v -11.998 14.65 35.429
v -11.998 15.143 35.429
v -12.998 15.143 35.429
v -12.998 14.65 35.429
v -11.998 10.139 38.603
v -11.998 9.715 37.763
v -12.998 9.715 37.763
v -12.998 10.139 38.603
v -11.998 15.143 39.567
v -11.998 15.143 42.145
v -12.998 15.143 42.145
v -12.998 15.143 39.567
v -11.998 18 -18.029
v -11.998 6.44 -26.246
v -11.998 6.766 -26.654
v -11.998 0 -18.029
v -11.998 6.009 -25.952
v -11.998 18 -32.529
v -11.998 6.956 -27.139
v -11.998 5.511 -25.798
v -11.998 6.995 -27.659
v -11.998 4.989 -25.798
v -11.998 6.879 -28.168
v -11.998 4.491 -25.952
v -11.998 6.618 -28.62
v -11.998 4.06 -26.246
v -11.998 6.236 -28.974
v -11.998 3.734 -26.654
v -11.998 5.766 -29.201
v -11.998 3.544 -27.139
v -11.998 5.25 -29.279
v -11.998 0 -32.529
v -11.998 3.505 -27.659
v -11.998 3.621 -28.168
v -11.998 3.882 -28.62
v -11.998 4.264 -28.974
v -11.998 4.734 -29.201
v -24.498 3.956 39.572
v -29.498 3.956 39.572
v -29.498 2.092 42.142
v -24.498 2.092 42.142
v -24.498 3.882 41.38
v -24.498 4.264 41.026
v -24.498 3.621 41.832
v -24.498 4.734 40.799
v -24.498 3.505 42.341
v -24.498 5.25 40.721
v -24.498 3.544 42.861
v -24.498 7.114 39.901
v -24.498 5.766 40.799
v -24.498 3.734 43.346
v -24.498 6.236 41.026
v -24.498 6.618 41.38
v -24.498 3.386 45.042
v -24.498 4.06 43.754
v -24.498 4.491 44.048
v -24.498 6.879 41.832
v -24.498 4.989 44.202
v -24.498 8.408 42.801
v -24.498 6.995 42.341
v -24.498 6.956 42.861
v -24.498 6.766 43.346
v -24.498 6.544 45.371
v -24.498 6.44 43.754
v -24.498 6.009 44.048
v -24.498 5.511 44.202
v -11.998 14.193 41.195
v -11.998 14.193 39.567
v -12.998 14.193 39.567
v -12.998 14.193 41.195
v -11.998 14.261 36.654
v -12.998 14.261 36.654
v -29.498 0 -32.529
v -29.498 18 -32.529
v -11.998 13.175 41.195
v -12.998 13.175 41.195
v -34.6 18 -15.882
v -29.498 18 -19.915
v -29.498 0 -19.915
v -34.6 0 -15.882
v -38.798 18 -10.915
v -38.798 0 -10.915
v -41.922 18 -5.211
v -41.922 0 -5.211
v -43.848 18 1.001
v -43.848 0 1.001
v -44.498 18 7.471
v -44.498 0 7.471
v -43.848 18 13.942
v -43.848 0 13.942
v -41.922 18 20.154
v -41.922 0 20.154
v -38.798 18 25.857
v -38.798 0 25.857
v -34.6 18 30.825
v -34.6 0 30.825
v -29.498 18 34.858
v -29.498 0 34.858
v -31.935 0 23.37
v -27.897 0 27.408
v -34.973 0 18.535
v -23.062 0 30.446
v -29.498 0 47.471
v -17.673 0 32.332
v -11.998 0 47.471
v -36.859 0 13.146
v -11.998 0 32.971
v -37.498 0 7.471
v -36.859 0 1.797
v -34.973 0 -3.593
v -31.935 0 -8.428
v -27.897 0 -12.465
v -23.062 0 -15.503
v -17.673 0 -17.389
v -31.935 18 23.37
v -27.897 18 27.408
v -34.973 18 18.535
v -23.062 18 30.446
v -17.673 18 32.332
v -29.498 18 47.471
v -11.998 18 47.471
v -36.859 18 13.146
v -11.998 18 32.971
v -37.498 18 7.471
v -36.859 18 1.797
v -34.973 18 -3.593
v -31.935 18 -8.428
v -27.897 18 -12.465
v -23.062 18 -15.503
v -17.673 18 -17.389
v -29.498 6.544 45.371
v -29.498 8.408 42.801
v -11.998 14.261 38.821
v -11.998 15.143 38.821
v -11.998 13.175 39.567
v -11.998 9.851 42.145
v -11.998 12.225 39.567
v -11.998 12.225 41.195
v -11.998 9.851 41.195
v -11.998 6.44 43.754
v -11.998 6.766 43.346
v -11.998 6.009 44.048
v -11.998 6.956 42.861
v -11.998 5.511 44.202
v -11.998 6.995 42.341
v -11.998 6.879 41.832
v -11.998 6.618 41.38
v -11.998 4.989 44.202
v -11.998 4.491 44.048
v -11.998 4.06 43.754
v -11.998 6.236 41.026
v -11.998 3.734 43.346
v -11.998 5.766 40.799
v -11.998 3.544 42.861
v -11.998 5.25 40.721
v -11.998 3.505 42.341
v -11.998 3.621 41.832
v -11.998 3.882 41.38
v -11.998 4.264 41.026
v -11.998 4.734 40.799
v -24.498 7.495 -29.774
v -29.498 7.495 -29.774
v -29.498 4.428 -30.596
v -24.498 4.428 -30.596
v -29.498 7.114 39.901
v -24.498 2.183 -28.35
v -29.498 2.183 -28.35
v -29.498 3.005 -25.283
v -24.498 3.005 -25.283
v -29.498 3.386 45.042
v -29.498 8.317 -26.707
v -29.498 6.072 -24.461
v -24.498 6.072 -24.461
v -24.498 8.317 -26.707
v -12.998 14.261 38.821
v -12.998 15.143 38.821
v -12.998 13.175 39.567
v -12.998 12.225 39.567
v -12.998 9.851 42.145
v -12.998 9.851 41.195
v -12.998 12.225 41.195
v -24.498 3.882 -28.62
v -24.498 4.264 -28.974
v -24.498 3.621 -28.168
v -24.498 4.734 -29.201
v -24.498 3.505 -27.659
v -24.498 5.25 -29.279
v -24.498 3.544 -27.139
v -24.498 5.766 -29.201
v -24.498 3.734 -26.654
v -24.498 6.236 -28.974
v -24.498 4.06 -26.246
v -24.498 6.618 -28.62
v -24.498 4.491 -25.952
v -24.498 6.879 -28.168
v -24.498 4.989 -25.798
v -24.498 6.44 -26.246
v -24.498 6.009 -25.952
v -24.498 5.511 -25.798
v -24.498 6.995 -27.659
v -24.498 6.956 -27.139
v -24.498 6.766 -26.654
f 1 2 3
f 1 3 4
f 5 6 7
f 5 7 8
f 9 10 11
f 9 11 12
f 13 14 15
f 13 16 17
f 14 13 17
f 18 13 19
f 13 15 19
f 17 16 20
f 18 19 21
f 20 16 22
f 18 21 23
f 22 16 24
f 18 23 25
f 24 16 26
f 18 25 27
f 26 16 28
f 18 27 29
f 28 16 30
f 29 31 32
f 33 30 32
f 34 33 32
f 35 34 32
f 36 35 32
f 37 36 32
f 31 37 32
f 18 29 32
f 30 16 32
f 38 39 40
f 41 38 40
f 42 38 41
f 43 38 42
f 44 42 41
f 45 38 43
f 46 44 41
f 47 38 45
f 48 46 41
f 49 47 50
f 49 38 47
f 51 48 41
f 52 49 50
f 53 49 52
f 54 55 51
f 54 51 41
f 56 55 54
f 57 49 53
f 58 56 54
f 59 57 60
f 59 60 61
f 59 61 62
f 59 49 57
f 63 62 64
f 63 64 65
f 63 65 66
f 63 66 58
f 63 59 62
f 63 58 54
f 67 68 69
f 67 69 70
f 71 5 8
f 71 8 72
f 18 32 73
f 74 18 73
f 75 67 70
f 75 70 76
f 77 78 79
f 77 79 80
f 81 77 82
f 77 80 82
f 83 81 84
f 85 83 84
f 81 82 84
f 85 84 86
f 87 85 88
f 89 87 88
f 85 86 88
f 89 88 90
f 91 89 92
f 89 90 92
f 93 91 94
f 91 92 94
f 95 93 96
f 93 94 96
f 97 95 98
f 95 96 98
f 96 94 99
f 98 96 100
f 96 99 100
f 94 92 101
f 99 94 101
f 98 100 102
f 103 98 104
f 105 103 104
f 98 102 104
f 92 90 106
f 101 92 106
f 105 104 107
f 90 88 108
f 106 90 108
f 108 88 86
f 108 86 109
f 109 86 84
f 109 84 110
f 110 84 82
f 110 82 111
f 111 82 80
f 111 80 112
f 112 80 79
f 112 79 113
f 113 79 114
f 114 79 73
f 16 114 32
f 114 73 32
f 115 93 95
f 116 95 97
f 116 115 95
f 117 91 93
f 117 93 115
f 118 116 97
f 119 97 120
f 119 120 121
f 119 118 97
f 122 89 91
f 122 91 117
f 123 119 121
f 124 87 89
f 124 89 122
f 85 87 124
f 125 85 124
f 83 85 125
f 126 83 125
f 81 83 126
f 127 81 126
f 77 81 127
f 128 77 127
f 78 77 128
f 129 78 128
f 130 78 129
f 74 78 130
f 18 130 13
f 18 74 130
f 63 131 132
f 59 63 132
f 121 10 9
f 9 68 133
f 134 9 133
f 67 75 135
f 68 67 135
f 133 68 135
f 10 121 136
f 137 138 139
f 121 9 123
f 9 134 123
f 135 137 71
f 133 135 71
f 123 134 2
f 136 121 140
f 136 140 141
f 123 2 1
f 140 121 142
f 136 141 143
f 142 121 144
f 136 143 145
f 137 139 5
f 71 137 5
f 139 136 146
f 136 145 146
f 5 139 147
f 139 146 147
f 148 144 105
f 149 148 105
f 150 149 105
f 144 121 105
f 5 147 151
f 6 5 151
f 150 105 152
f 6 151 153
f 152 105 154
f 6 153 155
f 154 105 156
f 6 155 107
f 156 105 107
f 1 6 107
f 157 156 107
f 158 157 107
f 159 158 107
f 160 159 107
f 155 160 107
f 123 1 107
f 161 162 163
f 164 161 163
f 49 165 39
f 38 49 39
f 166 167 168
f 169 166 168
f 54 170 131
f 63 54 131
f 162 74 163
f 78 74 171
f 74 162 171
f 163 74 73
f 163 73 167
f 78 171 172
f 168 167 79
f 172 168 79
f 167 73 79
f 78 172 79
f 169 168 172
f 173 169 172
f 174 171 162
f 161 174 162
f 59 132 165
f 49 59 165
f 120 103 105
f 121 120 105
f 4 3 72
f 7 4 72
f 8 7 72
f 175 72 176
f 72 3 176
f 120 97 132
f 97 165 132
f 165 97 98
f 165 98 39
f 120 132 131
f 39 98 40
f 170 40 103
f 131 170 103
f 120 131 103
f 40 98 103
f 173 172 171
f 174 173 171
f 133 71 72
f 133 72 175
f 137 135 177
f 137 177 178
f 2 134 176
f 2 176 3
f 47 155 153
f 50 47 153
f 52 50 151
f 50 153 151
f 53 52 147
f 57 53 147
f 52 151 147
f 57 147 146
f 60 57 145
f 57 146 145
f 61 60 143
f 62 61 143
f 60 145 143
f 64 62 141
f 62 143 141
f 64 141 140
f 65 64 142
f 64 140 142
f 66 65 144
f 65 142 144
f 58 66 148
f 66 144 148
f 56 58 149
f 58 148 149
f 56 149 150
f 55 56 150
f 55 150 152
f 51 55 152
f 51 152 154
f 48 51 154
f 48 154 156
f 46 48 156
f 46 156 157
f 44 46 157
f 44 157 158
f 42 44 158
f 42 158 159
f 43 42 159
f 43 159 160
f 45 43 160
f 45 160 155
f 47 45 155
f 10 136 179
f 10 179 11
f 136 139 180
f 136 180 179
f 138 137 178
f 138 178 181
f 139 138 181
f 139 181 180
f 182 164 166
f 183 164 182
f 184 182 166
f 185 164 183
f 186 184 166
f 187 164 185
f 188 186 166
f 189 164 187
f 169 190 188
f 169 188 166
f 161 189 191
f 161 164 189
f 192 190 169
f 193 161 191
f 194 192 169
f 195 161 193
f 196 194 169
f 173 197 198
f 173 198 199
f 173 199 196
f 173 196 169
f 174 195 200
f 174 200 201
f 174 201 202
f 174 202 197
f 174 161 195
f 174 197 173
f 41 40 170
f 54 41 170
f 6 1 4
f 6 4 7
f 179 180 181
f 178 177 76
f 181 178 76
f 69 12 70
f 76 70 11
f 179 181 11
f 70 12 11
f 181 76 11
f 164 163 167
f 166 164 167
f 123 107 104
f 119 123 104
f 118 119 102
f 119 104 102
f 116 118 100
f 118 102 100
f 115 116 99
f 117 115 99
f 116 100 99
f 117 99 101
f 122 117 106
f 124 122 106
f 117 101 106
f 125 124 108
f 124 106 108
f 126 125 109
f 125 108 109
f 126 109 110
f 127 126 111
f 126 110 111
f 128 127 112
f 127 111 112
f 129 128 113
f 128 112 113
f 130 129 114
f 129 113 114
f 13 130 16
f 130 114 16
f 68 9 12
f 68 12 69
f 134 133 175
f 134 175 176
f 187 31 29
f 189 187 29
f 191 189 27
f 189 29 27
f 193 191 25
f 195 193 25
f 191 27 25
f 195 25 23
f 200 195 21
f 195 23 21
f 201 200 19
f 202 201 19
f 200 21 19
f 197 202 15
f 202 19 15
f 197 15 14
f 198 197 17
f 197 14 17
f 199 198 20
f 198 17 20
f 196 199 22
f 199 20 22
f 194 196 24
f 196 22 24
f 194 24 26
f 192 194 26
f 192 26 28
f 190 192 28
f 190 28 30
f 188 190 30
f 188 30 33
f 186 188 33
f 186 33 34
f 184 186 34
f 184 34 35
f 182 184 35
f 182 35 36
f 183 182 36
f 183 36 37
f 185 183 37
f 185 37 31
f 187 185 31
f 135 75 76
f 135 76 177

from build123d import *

# Parameters (mm, degrees)
BOSS_EXTRUDE1_DEPTH = 18
SKETCH2_R           = 1.75
CUT_EXTRUDE1_DEPTH  = 33.5
CUT_EXTRUDE2_DEPTH  = 1
CUT_EXTRUDE3_DEPTH  = 5


with BuildPart() as part:
    # Sketch1 → Boss-Extrude1 (new body)
    with BuildSketch(Plane(origin=(0, 0, 0), x_dir=(1, 0, 0), z_dir=(0, 1, 0))):
        with BuildLine():
            Line((-11.998275301, 32.528571429), (-29.498275301, 32.528571429))
            Line((-29.498275301, 32.528571429), (-29.498275301, 19.914699304))
            ThreePointArc((-29.498275301, 19.914699304), (-21.114218589, 23.723916882), (-11.998275301, 25.028571429))
            Line((-11.998275301, 25.028571429), (-11.998275301, 32.528571429))
        make_face()
        with BuildLine():
            ThreePointArc((-11.998275301, 25.028571429), (-21.114218589, 23.723916882), (-29.498275301, 19.914699304))
            ThreePointArc((-29.498275301, 19.914699304), (-44.498275301, -7.471428571), (-29.498275301, -34.857556447))
            ThreePointArc((-29.498275301, -34.857556447), (-21.114218589, -38.666774025), (-11.998275301, -39.971428571))
            Line((-11.998275301, -39.971428571), (-11.998275301, -32.971428571))
            ThreePointArc((-11.998275301, -32.971428571), (-37.498275301, -7.471428571), (-11.998275301, 18.028571429))
            Line((-11.998275301, 18.028571429), (-11.998275301, 25.028571429))
        make_face()
        with BuildLine():
            Line((-29.498275301, -34.857556447), (-29.498275301, -47.471428571))
            Line((-29.498275301, -47.471428571), (-11.998275301, -47.471428571))
            Line((-11.998275301, -47.471428571), (-11.998275301, -39.971428571))
            ThreePointArc((-11.998275301, -39.971428571), (-21.114218589, -38.666774025), (-29.498275301, -34.857556447))
        make_face()
    extrude(amount=BOSS_EXTRUDE1_DEPTH)

    # Sketch2 → Cut-Extrude1 (cut, through all)
    with BuildSketch(Plane(origin=(-11.998275301, 0, 0), x_dir=(0, 0, -1), z_dir=(1, 0, 0))):
        with Locations((-42.471428571, 5.25)):
            Circle(SKETCH2_R)
        with Locations((27.528571429, 5.25)):
            Circle(SKETCH2_R)
    extrude(amount=-CUT_EXTRUDE1_DEPTH, mode=Mode.SUBTRACT)

    # Sketch3 → Cut-Extrude2 (cut)
    with BuildSketch(Plane(origin=(-11.998275301, 0, 0), x_dir=(0, 0, -1), z_dir=(1, 0, 0))):
        Polygon((-42.144930844, 15.142571671), (-39.566939391, 15.142571671), (-39.566939391, 14.192785347), (-41.195144519, 14.192785347), (-41.195144519, 13.175157142), (-39.566939391, 13.175157142), (-39.566939391, 12.225370817), (-41.195144519, 12.225370817), (-41.195144519, 9.850905005), (-42.144930844, 9.850905005), align=None)
        Polygon((-38.820678707, 15.142571671), (-35.42858469, 15.142571671), (-35.42858469, 14.64965801), (-37.762769385, 9.715221244), (-38.603372684, 10.139232996), (-36.653978654, 14.260627227), (-38.820678707, 14.260627227), align=None)
    extrude(amount=-CUT_EXTRUDE2_DEPTH, mode=Mode.SUBTRACT)

    # Sketch4 → Cut-Extrude3 (cut)
    with BuildSketch(Plane.ZY.offset(29.498275301)):
        Polygon((45.042020782, 3.385760472), (45.371203467, 6.544078393), (42.800611256, 8.408317922), (39.900836361, 7.114239528), (39.571653676, 3.955921607), (42.142245887, 2.091682078), align=None)
        Polygon((-25.283205831, 3.004634402), (-24.461344982, 6.071860849), (-26.706710579, 8.317226447), (-29.773937026, 7.495365598), (-30.595797876, 4.428139151), (-28.350432278, 2.182773553), align=None)
    extrude(amount=-CUT_EXTRUDE3_DEPTH, mode=Mode.SUBTRACT)


solid = part.part
